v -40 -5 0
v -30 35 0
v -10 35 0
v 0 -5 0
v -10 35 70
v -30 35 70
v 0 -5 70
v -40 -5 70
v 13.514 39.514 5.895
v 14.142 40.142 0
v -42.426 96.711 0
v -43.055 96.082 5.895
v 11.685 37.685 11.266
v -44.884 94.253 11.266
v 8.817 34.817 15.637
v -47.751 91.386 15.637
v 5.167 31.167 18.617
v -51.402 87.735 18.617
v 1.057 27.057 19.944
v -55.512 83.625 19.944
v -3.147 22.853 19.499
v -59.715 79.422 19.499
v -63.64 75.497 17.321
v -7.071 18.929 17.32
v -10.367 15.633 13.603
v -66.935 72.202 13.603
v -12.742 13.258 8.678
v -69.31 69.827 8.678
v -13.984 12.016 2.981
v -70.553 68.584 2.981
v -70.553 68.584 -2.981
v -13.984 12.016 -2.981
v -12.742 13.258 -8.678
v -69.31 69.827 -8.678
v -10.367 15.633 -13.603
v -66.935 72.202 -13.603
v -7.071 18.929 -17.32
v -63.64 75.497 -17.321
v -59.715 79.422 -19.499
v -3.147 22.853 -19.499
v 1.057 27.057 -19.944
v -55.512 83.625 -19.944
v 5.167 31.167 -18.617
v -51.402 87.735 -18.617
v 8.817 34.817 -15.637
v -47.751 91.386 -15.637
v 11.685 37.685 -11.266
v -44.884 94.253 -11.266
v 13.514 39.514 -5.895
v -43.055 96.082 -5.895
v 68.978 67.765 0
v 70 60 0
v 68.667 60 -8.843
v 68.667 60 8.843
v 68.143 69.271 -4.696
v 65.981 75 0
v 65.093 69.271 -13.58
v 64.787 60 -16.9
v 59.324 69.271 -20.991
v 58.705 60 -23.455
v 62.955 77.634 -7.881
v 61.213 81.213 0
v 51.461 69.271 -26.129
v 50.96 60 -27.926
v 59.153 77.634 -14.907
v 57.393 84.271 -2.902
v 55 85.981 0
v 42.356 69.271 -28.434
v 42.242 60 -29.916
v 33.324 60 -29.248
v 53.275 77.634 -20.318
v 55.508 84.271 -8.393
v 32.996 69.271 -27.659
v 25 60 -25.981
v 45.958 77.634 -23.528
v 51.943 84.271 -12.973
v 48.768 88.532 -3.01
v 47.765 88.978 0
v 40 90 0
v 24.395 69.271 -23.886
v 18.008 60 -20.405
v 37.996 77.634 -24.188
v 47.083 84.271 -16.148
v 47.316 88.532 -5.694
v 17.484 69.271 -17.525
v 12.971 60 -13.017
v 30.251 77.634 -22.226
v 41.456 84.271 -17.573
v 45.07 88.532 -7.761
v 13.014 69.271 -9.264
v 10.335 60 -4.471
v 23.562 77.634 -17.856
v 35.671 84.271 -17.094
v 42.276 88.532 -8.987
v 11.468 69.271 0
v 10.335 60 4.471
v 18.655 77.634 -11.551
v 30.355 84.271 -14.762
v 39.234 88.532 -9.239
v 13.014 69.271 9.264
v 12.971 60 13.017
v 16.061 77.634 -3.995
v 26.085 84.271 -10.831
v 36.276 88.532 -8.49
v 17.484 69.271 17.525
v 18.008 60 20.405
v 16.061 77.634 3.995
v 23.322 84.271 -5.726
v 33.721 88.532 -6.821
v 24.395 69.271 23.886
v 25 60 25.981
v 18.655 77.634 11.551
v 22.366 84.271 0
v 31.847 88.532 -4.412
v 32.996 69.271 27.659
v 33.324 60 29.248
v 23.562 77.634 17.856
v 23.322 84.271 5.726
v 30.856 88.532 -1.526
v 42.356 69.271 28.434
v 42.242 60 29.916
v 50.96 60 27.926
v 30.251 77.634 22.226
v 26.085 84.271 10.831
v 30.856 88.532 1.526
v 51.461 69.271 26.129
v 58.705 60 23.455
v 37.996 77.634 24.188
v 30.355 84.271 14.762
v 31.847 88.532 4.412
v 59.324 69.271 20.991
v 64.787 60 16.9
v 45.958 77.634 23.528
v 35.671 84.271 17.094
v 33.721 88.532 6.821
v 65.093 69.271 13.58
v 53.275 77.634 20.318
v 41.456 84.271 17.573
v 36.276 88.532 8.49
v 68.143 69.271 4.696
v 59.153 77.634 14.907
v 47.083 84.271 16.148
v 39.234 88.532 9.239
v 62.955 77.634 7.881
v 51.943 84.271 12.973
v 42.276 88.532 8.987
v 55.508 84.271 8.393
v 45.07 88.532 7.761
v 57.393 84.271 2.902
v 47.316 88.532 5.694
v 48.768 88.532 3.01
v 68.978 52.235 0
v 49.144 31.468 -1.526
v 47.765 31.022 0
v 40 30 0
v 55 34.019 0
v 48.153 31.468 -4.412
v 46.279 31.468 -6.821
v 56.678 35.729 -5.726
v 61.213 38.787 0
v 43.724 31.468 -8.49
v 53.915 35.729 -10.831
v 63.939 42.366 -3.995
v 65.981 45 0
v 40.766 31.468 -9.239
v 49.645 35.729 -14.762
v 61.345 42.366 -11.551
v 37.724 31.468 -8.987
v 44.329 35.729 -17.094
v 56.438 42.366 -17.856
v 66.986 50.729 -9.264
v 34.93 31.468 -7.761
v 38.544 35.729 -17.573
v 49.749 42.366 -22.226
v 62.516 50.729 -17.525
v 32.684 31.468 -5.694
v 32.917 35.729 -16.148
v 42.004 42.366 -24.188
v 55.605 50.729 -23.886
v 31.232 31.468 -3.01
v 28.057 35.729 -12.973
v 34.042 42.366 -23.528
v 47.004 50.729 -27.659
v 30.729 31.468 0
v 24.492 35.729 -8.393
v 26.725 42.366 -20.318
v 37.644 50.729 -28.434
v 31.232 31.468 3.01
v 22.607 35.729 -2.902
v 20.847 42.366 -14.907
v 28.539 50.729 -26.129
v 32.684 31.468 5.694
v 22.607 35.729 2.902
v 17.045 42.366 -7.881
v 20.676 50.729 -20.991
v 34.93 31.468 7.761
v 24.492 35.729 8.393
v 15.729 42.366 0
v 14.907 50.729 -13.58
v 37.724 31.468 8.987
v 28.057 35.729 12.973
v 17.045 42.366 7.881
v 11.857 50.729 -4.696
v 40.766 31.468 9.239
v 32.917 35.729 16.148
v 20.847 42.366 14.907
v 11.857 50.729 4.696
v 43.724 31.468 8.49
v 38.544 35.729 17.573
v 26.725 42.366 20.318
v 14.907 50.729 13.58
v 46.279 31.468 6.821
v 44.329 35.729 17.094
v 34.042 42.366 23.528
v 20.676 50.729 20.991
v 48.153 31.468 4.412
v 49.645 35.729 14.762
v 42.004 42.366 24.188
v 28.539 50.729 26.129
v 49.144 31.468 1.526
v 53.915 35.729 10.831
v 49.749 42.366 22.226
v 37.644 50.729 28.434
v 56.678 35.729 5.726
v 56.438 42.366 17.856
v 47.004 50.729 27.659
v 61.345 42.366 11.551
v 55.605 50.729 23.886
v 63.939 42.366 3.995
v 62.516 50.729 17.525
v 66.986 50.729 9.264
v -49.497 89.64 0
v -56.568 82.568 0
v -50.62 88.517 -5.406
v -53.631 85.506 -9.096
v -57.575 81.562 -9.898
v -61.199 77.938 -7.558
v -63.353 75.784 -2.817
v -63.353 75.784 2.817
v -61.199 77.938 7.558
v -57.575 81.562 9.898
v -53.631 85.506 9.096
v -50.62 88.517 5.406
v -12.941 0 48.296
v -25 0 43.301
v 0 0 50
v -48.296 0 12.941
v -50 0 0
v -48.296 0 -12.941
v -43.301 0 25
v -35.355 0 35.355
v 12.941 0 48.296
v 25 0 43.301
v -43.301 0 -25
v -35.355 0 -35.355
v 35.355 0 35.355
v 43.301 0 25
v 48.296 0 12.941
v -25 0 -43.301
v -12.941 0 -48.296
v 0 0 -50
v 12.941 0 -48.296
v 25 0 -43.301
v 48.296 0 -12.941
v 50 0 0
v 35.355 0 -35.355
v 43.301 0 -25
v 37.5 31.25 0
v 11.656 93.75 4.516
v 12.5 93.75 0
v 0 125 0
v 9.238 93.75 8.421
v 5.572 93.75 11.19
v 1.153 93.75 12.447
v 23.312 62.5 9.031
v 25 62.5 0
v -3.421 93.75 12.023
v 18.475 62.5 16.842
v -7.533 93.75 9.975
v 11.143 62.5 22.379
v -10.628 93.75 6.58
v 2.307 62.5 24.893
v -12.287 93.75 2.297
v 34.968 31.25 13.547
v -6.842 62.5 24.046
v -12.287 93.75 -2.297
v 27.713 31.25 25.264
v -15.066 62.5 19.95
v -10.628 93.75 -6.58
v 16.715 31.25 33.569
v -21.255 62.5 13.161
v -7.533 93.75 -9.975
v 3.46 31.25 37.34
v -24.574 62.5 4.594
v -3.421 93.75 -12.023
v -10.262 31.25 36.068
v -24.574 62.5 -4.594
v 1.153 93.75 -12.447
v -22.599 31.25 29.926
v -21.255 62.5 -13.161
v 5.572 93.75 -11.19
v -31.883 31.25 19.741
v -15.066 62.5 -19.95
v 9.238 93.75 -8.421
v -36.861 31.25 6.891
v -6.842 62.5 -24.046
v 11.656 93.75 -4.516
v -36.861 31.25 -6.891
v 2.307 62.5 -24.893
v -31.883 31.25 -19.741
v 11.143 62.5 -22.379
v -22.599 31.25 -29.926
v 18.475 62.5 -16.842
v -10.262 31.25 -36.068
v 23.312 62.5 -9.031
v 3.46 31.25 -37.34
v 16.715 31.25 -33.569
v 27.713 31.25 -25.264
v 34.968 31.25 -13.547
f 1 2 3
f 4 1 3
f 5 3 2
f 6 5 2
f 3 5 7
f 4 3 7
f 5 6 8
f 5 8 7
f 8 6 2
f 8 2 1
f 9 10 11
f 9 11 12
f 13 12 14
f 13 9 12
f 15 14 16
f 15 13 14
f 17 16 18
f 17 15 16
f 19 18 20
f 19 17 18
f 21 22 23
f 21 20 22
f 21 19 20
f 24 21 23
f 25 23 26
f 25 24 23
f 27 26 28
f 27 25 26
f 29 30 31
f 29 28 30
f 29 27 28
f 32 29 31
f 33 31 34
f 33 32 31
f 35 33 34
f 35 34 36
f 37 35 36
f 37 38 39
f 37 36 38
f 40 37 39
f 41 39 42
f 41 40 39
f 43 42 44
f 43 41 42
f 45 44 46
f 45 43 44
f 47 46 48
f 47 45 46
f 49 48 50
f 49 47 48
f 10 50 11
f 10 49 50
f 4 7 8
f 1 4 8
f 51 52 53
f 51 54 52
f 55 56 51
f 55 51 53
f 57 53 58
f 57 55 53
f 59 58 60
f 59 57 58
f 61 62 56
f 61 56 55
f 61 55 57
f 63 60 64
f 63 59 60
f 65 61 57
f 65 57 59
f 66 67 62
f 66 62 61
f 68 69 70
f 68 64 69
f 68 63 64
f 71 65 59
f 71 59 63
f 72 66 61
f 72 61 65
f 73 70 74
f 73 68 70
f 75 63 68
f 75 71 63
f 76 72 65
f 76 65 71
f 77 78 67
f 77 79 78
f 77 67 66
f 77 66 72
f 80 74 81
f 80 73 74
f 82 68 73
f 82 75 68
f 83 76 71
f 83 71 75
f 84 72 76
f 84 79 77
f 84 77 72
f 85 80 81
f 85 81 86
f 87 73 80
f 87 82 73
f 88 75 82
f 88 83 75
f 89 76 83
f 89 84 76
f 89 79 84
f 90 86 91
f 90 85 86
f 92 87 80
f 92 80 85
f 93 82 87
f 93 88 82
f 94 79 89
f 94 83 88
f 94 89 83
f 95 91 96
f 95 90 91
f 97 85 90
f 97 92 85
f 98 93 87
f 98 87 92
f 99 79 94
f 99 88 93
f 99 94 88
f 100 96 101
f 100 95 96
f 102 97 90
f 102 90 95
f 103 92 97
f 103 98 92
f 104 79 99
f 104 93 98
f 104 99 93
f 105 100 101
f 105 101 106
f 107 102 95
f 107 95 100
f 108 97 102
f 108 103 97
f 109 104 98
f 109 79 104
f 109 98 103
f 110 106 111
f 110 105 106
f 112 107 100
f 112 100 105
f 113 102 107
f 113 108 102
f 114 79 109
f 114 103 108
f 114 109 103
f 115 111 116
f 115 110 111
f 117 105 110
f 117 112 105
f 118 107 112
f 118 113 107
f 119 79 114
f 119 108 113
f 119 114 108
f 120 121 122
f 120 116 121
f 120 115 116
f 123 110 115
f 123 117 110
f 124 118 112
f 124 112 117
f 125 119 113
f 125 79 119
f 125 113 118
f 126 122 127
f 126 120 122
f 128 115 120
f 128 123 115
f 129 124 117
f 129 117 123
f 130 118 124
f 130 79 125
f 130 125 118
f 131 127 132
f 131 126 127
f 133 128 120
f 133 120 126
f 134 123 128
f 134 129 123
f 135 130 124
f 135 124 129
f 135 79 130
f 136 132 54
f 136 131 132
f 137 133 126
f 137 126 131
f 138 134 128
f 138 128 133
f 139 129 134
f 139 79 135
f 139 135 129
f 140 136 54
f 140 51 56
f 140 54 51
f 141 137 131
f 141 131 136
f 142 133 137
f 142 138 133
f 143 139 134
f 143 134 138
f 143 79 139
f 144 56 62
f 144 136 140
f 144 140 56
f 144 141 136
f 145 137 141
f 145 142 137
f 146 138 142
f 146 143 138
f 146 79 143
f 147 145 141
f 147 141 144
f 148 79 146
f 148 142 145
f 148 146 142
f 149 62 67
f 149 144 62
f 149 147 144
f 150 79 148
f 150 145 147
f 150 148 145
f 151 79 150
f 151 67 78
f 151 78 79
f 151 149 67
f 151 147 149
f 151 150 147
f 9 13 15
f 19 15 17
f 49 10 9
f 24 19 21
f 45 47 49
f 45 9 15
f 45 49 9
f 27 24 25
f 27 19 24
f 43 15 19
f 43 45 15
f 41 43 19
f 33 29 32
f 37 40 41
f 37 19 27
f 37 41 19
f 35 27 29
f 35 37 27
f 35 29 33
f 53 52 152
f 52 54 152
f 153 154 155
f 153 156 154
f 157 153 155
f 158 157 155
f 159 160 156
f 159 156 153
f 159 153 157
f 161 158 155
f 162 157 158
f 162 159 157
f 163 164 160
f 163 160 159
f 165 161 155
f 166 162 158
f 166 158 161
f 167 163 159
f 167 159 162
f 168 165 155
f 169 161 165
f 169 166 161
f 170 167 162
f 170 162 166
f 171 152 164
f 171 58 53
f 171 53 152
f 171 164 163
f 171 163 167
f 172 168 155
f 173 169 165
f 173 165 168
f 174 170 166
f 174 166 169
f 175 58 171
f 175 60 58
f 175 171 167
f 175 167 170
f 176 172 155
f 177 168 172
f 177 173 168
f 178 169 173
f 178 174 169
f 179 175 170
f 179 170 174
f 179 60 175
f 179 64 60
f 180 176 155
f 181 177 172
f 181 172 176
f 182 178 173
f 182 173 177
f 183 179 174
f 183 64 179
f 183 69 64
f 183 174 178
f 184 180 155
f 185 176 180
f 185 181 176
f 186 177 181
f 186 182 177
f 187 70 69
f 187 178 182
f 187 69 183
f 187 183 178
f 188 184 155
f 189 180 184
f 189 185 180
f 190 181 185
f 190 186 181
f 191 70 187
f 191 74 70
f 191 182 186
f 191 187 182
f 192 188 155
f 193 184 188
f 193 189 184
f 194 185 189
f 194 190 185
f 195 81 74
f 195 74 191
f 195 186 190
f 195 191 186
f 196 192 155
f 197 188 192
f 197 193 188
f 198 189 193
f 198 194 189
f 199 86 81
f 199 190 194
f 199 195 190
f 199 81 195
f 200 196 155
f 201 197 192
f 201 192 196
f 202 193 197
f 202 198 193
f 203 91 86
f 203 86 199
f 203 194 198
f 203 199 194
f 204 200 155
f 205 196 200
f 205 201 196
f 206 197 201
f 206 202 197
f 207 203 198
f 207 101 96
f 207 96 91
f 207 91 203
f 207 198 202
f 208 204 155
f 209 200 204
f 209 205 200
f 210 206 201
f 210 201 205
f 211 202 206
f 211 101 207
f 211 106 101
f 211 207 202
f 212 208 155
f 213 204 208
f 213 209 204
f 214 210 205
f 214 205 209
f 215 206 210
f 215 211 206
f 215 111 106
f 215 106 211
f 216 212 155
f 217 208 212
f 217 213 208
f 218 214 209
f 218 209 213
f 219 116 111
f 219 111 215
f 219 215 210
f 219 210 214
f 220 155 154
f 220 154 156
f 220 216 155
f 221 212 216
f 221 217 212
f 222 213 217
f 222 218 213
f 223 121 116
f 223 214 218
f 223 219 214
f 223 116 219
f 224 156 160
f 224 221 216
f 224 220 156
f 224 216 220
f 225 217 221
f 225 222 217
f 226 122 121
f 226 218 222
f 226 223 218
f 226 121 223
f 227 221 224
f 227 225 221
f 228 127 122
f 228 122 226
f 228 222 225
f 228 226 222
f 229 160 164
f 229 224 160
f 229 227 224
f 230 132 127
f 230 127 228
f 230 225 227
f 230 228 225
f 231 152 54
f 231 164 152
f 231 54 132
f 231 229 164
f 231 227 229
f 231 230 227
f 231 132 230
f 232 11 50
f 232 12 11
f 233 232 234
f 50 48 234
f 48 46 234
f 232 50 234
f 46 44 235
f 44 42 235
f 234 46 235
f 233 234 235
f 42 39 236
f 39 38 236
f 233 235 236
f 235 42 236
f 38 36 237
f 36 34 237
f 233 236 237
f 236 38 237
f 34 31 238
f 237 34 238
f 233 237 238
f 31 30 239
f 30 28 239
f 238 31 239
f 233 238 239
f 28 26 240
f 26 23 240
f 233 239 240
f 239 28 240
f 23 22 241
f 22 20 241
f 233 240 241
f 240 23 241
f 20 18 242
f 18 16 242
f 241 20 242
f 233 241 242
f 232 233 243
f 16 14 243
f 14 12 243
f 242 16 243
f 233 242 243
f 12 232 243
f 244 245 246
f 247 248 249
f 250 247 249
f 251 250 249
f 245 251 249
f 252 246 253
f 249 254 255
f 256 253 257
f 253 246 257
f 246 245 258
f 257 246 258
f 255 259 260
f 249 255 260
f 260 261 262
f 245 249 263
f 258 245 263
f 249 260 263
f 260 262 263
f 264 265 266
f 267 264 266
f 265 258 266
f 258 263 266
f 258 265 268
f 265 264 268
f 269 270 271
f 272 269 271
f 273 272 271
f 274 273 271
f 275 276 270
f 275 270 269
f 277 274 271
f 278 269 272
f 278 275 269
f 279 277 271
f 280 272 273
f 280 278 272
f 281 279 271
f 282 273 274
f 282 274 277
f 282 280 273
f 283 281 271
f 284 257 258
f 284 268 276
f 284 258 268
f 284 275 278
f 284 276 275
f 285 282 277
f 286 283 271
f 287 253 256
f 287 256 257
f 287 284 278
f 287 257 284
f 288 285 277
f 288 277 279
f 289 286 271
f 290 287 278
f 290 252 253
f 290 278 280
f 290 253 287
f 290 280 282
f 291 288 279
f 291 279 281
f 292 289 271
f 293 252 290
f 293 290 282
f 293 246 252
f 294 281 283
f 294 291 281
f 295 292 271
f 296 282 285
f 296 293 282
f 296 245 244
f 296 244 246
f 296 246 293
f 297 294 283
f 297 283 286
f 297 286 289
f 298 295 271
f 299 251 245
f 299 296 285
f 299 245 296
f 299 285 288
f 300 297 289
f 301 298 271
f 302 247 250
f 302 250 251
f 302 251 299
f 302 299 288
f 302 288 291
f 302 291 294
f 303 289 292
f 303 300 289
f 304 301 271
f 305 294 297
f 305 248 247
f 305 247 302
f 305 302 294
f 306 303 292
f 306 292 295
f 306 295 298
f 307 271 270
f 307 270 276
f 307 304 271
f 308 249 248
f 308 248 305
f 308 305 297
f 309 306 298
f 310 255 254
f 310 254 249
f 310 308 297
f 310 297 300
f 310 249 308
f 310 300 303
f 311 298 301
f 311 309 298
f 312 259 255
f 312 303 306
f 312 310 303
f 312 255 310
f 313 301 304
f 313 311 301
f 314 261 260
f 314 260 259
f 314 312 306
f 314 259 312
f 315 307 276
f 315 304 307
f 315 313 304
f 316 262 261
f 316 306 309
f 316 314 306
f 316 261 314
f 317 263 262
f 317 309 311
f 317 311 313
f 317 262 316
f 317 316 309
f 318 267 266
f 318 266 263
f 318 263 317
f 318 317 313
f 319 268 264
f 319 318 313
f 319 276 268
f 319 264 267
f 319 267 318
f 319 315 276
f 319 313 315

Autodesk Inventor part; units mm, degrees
ref_plane "YZ Plane" through (0, 0, 0) normal (1, 0, 0) x (0, 1, 0)
ref_plane "XZ Plane" through (0, 0, 0) normal (0, 1, 0) x (-1, 0, 0)
ref_plane "XY Plane" through (0, 0, 0) normal (0, 0, 1) x (1, 0, 0)
sketch "Эскиз2" plane through (0, 0, 0) normal (0, 0, 1) x (1, 0, 0)
  line L0 (0, 0) -> (50, 0)
  line L1 (0, 0) -> (0, 125)
  line L2 (0, 125) -> (50, 0)
  dimension "d4" = 50
  dimension "d5" = 125
revolve "Вращение2" add sketch "Эскиз2" angle 360 about axis through (0, 0, 0) along (0, 1, 0)
sketch "Эскиз3" plane through (0, 0, 0) normal (0, 0, 1) x (1, 0, 0)
  line L0 (0, -5) -> (-40, -5)
  line L1 (-10, 35) -> (0, -5)
  line L2 (-10, 35) -> (-30, 35)
  line L3 (-50, 0) -> (50, 0) projected
  line L4 (-30, 35) -> (-40, -5)
  point P0 (0, 0)
  dimension "d7" = 40
  dimension "d8" = 20
extrude "Выдавливание1" add sketch "Эскиз3" along normal blind 70 separate body
sketch "Эскиз4" plane through (0, 0, 0) normal (0, 0, 1) x (1, 0, 0)
  circle A0 centre (40, 60) radius 30
  line L0 (40, 90) -> (40, 30)
  point P0 (0, 0)
  dimension "d11" = 60
revolve "Вращение3" add sketch "Эскиз4" angle 360 about axis through (40, 90, 0) along (0, -1, 0) separate body picked at (52.2687, 66.2349) contours A0 L0
sketch "Эскиз5" plane through (0, 0, 0) normal (0, 0, 1) x (1, 0, 0)
  line L0 (0, 26) -> (-56.5685, 82.5685)
  line L1 (-56.5685, 82.5685) -> (-42.4264, 96.7107)
  line L2 (-42.4264, 96.7107) -> (14.1421, 40.1421)
  line L3 (14.1421, 40.1421) -> (0, 26)
  line L4 (0, 26) -> (80, 26) construction
  point P0 (0, 0)
  dimension "d13" = 80
  dimension "d14" = 135
  dimension "d15" = 20
revolve "Вращение4" add sketch "Эскиз5" angle 360 about axis through (0, 26, 0) along (-0.7071, 0.7071, 0) separate body
